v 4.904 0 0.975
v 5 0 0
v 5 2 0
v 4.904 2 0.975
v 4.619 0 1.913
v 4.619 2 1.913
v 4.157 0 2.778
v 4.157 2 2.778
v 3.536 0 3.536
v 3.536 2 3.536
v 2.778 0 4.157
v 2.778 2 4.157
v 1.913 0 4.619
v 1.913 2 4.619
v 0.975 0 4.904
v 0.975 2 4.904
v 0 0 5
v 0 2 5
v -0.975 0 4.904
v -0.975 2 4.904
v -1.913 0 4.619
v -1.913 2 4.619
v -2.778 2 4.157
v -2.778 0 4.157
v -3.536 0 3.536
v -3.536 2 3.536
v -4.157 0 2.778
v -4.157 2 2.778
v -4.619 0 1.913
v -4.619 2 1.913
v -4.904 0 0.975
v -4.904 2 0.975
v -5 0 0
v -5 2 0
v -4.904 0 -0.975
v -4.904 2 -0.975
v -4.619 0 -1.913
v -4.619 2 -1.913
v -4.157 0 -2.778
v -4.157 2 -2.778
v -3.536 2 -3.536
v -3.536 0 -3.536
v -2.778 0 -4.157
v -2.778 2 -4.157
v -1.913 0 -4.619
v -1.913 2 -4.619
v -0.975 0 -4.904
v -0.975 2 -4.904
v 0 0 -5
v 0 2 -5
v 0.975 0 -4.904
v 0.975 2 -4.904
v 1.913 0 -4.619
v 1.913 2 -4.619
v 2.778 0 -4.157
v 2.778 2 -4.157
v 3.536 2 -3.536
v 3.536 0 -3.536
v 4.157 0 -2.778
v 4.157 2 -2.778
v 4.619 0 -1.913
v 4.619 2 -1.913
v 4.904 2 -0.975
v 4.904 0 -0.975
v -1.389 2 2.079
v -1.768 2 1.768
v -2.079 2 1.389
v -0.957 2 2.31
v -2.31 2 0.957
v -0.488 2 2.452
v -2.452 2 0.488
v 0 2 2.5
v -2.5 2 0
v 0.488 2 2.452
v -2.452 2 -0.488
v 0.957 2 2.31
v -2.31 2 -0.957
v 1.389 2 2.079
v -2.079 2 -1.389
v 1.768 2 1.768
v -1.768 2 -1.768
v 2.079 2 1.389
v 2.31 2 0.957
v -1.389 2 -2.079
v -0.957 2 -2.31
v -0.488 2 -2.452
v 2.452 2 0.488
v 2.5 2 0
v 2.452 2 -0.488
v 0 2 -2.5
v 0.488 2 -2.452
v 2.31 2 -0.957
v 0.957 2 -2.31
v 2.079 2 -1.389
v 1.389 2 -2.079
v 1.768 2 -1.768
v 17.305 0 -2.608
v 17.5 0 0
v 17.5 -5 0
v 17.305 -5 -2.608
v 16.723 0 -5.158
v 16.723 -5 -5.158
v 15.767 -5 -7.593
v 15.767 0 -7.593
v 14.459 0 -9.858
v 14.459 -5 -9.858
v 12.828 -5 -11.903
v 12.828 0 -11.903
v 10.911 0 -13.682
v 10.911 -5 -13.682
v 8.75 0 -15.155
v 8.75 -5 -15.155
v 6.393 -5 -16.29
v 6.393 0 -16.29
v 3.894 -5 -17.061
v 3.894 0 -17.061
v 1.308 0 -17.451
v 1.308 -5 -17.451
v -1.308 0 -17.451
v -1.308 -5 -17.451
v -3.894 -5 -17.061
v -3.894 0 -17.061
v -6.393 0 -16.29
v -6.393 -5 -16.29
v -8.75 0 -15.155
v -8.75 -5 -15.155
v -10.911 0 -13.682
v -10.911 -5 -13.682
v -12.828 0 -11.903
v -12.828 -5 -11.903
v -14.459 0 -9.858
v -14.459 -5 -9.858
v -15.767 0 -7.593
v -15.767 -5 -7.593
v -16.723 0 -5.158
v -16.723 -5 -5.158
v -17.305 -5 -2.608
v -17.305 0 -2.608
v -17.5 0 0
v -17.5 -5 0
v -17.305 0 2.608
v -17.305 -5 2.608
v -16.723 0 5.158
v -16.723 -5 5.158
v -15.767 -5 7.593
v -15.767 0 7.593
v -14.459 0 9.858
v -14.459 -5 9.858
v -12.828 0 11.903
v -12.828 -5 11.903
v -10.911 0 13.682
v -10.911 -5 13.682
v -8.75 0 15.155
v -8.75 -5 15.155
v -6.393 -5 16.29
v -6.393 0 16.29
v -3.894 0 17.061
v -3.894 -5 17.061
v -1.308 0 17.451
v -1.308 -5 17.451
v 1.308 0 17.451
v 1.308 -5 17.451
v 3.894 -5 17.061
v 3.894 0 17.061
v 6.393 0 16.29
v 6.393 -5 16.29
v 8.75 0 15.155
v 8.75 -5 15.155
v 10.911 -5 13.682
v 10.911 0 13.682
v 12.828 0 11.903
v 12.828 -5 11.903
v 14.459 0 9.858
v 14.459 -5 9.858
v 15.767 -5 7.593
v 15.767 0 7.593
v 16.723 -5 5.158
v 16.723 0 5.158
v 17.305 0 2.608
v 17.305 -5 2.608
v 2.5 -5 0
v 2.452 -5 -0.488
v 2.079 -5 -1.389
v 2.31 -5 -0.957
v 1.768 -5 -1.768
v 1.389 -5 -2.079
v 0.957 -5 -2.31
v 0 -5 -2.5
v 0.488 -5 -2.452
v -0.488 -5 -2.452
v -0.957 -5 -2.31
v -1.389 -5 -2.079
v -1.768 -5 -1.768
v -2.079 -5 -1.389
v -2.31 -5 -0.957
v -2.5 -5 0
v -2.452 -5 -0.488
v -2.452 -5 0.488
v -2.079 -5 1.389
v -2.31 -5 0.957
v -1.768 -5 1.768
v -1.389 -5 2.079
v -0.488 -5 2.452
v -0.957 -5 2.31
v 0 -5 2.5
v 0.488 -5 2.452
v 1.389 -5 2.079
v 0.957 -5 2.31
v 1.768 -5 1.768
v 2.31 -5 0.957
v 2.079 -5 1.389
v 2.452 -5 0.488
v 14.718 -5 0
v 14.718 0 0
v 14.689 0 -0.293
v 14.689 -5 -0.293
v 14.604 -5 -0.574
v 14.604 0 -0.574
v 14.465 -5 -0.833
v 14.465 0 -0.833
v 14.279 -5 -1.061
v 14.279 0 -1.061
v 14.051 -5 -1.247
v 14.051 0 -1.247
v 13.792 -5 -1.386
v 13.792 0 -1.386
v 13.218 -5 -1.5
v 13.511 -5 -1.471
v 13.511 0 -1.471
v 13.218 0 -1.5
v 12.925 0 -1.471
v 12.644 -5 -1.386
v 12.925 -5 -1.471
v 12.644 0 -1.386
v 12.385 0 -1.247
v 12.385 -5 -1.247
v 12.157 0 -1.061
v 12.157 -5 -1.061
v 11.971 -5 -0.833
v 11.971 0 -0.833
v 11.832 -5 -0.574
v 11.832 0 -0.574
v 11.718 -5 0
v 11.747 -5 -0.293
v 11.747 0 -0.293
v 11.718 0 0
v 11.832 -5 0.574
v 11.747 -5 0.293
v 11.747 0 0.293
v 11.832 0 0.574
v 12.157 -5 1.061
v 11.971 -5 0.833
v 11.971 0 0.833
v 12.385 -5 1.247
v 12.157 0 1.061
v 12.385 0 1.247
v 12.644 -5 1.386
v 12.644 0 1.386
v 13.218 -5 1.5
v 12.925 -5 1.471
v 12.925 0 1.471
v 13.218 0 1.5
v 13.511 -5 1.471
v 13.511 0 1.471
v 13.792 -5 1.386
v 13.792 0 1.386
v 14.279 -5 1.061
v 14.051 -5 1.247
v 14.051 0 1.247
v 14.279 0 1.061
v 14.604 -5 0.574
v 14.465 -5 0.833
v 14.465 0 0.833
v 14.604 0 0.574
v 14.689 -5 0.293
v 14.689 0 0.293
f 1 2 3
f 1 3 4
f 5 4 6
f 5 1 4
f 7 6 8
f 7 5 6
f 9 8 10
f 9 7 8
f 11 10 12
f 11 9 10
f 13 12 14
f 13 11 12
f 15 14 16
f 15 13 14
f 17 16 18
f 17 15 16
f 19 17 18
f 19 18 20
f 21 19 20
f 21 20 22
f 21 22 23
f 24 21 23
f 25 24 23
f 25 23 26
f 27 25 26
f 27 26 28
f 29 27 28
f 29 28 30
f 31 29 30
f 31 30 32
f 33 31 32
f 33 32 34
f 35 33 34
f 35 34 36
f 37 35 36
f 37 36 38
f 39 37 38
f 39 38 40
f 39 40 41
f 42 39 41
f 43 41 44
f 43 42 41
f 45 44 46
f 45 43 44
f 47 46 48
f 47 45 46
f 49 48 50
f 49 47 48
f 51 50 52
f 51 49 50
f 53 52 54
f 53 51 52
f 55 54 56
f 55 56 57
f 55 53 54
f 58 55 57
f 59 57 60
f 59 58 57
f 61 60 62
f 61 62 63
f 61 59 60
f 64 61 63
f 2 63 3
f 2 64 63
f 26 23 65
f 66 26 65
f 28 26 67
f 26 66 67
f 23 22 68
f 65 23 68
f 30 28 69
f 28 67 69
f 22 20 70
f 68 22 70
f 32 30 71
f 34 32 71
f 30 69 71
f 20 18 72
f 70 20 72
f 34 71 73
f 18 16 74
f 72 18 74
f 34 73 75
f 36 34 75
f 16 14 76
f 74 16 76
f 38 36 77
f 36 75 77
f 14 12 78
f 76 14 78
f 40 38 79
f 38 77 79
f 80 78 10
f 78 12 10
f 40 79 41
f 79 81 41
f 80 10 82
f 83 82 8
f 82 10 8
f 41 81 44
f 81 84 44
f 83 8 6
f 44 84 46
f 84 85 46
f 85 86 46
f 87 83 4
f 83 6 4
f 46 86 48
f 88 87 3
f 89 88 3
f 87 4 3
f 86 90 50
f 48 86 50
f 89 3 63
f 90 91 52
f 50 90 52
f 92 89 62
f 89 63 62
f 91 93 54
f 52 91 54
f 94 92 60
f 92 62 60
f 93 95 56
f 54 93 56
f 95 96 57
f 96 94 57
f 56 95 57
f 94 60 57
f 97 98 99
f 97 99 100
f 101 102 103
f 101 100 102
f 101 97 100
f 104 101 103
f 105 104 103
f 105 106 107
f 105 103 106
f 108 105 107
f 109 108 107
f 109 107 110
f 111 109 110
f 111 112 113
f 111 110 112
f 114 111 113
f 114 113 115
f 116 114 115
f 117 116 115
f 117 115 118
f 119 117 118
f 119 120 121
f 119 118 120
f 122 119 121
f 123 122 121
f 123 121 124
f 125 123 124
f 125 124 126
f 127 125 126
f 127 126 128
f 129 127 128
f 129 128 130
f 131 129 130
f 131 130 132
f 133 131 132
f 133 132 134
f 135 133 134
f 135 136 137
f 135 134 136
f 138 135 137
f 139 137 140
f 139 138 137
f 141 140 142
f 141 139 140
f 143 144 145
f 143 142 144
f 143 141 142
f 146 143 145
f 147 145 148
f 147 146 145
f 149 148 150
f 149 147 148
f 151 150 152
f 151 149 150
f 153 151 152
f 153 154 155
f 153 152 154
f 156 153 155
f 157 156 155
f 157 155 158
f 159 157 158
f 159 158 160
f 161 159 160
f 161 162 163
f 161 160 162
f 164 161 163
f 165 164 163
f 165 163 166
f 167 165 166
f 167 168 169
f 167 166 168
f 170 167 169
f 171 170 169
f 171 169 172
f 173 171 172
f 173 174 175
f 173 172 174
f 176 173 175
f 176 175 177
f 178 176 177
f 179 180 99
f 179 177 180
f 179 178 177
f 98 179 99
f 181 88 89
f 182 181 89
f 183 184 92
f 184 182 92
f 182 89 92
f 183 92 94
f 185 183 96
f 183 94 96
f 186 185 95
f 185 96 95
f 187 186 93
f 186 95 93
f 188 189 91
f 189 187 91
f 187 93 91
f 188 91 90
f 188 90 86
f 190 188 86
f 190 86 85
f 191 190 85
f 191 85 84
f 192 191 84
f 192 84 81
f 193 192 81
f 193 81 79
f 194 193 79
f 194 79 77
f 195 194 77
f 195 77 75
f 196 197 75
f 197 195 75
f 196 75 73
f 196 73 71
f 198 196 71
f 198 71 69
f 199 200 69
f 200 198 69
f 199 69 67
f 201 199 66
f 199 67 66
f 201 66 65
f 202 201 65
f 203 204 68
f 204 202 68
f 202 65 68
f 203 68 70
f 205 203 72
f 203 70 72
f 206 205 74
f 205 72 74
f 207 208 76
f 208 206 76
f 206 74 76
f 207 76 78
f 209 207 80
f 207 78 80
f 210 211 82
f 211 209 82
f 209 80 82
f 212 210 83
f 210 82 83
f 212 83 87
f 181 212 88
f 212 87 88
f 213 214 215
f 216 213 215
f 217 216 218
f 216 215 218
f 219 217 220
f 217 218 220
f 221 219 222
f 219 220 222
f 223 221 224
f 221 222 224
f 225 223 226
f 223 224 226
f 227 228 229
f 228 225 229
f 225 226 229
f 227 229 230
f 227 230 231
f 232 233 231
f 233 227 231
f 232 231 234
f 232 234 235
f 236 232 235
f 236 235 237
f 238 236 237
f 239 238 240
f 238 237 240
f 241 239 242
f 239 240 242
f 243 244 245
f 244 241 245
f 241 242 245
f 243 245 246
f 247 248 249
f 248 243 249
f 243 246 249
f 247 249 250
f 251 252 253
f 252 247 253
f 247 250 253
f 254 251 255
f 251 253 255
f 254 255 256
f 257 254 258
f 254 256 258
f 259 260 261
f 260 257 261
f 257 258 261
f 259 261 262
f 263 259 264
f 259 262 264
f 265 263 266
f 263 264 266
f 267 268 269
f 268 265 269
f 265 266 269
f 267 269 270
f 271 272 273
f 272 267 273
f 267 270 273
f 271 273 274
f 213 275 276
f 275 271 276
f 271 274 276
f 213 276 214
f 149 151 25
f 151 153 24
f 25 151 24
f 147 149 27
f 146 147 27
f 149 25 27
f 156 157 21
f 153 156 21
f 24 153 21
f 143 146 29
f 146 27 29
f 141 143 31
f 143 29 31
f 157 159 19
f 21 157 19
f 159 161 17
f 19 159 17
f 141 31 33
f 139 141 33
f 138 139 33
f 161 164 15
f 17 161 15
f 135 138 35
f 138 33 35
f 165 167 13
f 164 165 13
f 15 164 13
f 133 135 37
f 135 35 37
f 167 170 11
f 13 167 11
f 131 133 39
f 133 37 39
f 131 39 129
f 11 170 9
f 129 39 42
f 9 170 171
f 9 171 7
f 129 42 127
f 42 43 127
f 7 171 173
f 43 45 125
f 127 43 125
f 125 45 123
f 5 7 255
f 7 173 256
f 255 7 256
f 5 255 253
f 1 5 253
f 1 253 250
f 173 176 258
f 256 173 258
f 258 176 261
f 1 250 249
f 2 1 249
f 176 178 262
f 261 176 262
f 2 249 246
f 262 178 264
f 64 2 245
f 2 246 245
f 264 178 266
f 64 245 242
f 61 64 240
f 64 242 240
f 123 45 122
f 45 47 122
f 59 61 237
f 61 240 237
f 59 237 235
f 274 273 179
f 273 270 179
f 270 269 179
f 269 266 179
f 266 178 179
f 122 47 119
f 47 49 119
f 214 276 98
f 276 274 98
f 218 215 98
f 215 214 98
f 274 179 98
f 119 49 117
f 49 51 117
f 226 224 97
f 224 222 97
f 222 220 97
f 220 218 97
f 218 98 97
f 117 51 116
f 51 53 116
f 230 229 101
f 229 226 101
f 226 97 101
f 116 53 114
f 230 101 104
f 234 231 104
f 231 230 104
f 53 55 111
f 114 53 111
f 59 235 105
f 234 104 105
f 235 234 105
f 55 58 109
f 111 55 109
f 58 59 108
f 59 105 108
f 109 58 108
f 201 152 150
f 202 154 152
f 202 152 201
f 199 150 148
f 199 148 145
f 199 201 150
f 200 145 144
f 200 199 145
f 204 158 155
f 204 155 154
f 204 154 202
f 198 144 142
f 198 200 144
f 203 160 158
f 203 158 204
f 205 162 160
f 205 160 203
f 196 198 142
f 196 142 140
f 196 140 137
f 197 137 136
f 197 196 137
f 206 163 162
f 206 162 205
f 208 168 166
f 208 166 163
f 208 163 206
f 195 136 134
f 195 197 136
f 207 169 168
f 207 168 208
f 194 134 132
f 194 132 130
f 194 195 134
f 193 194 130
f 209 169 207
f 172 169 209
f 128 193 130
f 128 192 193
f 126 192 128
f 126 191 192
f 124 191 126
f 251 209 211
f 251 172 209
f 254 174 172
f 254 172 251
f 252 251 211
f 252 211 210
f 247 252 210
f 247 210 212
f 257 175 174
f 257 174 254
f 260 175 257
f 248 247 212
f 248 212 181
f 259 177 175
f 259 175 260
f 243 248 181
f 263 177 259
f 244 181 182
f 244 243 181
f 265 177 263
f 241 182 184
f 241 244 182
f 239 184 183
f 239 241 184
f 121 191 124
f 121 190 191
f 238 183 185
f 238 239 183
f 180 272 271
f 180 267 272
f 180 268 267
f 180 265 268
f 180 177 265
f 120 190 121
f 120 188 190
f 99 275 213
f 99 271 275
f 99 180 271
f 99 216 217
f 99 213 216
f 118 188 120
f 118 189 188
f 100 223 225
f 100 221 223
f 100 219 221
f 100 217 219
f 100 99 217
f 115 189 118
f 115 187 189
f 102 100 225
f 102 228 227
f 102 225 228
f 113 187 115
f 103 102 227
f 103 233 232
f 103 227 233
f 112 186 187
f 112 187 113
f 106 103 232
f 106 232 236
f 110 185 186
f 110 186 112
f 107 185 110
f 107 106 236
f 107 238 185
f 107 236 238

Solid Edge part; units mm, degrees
sketch "Sketch1" plane through (0, 0, 0) normal (0, -1, 0) x (1, 0, 0)
  circle A0 centre (0, 0) radius 17.5
extrude "Protrusion1" add sketch "Sketch1" along normal blind 5
sketch "Sketch2" plane through (0, 0, 0) normal (0, -1, 0) x (1, 0, 0)
  circle A0 centre (0, 0) radius 5
extrude "ExtrudedProtrusion_2" add sketch "Sketch2" against normal blind 2
sketch "Sketch3" plane through (0, 0, 0) normal (0, -1, 0) x (1, 0, 0)
  circle A0 centre (0, 0) radius 2.5
extrude "ExtrudedCutout_3" cut sketch "Sketch3" against normal blind 2
sketch "Sketch4" plane through (0, 0, 0) normal (0, -1, 0) x (1, 0, 0)
  circle A0 centre (0, 0) radius 2.5
extrude "ExtrudedCutout_4" cut sketch "Sketch4" along normal blind 5
sketch "Sketch5" plane through (0, 0, 0) normal (0, -1, 0) x (1, 0, 0)
  circle A0 centre (13.2181, 0) radius 1.5
extrude "ExtrudedCutout_5" cut sketch "Sketch5" along normal blind 5
